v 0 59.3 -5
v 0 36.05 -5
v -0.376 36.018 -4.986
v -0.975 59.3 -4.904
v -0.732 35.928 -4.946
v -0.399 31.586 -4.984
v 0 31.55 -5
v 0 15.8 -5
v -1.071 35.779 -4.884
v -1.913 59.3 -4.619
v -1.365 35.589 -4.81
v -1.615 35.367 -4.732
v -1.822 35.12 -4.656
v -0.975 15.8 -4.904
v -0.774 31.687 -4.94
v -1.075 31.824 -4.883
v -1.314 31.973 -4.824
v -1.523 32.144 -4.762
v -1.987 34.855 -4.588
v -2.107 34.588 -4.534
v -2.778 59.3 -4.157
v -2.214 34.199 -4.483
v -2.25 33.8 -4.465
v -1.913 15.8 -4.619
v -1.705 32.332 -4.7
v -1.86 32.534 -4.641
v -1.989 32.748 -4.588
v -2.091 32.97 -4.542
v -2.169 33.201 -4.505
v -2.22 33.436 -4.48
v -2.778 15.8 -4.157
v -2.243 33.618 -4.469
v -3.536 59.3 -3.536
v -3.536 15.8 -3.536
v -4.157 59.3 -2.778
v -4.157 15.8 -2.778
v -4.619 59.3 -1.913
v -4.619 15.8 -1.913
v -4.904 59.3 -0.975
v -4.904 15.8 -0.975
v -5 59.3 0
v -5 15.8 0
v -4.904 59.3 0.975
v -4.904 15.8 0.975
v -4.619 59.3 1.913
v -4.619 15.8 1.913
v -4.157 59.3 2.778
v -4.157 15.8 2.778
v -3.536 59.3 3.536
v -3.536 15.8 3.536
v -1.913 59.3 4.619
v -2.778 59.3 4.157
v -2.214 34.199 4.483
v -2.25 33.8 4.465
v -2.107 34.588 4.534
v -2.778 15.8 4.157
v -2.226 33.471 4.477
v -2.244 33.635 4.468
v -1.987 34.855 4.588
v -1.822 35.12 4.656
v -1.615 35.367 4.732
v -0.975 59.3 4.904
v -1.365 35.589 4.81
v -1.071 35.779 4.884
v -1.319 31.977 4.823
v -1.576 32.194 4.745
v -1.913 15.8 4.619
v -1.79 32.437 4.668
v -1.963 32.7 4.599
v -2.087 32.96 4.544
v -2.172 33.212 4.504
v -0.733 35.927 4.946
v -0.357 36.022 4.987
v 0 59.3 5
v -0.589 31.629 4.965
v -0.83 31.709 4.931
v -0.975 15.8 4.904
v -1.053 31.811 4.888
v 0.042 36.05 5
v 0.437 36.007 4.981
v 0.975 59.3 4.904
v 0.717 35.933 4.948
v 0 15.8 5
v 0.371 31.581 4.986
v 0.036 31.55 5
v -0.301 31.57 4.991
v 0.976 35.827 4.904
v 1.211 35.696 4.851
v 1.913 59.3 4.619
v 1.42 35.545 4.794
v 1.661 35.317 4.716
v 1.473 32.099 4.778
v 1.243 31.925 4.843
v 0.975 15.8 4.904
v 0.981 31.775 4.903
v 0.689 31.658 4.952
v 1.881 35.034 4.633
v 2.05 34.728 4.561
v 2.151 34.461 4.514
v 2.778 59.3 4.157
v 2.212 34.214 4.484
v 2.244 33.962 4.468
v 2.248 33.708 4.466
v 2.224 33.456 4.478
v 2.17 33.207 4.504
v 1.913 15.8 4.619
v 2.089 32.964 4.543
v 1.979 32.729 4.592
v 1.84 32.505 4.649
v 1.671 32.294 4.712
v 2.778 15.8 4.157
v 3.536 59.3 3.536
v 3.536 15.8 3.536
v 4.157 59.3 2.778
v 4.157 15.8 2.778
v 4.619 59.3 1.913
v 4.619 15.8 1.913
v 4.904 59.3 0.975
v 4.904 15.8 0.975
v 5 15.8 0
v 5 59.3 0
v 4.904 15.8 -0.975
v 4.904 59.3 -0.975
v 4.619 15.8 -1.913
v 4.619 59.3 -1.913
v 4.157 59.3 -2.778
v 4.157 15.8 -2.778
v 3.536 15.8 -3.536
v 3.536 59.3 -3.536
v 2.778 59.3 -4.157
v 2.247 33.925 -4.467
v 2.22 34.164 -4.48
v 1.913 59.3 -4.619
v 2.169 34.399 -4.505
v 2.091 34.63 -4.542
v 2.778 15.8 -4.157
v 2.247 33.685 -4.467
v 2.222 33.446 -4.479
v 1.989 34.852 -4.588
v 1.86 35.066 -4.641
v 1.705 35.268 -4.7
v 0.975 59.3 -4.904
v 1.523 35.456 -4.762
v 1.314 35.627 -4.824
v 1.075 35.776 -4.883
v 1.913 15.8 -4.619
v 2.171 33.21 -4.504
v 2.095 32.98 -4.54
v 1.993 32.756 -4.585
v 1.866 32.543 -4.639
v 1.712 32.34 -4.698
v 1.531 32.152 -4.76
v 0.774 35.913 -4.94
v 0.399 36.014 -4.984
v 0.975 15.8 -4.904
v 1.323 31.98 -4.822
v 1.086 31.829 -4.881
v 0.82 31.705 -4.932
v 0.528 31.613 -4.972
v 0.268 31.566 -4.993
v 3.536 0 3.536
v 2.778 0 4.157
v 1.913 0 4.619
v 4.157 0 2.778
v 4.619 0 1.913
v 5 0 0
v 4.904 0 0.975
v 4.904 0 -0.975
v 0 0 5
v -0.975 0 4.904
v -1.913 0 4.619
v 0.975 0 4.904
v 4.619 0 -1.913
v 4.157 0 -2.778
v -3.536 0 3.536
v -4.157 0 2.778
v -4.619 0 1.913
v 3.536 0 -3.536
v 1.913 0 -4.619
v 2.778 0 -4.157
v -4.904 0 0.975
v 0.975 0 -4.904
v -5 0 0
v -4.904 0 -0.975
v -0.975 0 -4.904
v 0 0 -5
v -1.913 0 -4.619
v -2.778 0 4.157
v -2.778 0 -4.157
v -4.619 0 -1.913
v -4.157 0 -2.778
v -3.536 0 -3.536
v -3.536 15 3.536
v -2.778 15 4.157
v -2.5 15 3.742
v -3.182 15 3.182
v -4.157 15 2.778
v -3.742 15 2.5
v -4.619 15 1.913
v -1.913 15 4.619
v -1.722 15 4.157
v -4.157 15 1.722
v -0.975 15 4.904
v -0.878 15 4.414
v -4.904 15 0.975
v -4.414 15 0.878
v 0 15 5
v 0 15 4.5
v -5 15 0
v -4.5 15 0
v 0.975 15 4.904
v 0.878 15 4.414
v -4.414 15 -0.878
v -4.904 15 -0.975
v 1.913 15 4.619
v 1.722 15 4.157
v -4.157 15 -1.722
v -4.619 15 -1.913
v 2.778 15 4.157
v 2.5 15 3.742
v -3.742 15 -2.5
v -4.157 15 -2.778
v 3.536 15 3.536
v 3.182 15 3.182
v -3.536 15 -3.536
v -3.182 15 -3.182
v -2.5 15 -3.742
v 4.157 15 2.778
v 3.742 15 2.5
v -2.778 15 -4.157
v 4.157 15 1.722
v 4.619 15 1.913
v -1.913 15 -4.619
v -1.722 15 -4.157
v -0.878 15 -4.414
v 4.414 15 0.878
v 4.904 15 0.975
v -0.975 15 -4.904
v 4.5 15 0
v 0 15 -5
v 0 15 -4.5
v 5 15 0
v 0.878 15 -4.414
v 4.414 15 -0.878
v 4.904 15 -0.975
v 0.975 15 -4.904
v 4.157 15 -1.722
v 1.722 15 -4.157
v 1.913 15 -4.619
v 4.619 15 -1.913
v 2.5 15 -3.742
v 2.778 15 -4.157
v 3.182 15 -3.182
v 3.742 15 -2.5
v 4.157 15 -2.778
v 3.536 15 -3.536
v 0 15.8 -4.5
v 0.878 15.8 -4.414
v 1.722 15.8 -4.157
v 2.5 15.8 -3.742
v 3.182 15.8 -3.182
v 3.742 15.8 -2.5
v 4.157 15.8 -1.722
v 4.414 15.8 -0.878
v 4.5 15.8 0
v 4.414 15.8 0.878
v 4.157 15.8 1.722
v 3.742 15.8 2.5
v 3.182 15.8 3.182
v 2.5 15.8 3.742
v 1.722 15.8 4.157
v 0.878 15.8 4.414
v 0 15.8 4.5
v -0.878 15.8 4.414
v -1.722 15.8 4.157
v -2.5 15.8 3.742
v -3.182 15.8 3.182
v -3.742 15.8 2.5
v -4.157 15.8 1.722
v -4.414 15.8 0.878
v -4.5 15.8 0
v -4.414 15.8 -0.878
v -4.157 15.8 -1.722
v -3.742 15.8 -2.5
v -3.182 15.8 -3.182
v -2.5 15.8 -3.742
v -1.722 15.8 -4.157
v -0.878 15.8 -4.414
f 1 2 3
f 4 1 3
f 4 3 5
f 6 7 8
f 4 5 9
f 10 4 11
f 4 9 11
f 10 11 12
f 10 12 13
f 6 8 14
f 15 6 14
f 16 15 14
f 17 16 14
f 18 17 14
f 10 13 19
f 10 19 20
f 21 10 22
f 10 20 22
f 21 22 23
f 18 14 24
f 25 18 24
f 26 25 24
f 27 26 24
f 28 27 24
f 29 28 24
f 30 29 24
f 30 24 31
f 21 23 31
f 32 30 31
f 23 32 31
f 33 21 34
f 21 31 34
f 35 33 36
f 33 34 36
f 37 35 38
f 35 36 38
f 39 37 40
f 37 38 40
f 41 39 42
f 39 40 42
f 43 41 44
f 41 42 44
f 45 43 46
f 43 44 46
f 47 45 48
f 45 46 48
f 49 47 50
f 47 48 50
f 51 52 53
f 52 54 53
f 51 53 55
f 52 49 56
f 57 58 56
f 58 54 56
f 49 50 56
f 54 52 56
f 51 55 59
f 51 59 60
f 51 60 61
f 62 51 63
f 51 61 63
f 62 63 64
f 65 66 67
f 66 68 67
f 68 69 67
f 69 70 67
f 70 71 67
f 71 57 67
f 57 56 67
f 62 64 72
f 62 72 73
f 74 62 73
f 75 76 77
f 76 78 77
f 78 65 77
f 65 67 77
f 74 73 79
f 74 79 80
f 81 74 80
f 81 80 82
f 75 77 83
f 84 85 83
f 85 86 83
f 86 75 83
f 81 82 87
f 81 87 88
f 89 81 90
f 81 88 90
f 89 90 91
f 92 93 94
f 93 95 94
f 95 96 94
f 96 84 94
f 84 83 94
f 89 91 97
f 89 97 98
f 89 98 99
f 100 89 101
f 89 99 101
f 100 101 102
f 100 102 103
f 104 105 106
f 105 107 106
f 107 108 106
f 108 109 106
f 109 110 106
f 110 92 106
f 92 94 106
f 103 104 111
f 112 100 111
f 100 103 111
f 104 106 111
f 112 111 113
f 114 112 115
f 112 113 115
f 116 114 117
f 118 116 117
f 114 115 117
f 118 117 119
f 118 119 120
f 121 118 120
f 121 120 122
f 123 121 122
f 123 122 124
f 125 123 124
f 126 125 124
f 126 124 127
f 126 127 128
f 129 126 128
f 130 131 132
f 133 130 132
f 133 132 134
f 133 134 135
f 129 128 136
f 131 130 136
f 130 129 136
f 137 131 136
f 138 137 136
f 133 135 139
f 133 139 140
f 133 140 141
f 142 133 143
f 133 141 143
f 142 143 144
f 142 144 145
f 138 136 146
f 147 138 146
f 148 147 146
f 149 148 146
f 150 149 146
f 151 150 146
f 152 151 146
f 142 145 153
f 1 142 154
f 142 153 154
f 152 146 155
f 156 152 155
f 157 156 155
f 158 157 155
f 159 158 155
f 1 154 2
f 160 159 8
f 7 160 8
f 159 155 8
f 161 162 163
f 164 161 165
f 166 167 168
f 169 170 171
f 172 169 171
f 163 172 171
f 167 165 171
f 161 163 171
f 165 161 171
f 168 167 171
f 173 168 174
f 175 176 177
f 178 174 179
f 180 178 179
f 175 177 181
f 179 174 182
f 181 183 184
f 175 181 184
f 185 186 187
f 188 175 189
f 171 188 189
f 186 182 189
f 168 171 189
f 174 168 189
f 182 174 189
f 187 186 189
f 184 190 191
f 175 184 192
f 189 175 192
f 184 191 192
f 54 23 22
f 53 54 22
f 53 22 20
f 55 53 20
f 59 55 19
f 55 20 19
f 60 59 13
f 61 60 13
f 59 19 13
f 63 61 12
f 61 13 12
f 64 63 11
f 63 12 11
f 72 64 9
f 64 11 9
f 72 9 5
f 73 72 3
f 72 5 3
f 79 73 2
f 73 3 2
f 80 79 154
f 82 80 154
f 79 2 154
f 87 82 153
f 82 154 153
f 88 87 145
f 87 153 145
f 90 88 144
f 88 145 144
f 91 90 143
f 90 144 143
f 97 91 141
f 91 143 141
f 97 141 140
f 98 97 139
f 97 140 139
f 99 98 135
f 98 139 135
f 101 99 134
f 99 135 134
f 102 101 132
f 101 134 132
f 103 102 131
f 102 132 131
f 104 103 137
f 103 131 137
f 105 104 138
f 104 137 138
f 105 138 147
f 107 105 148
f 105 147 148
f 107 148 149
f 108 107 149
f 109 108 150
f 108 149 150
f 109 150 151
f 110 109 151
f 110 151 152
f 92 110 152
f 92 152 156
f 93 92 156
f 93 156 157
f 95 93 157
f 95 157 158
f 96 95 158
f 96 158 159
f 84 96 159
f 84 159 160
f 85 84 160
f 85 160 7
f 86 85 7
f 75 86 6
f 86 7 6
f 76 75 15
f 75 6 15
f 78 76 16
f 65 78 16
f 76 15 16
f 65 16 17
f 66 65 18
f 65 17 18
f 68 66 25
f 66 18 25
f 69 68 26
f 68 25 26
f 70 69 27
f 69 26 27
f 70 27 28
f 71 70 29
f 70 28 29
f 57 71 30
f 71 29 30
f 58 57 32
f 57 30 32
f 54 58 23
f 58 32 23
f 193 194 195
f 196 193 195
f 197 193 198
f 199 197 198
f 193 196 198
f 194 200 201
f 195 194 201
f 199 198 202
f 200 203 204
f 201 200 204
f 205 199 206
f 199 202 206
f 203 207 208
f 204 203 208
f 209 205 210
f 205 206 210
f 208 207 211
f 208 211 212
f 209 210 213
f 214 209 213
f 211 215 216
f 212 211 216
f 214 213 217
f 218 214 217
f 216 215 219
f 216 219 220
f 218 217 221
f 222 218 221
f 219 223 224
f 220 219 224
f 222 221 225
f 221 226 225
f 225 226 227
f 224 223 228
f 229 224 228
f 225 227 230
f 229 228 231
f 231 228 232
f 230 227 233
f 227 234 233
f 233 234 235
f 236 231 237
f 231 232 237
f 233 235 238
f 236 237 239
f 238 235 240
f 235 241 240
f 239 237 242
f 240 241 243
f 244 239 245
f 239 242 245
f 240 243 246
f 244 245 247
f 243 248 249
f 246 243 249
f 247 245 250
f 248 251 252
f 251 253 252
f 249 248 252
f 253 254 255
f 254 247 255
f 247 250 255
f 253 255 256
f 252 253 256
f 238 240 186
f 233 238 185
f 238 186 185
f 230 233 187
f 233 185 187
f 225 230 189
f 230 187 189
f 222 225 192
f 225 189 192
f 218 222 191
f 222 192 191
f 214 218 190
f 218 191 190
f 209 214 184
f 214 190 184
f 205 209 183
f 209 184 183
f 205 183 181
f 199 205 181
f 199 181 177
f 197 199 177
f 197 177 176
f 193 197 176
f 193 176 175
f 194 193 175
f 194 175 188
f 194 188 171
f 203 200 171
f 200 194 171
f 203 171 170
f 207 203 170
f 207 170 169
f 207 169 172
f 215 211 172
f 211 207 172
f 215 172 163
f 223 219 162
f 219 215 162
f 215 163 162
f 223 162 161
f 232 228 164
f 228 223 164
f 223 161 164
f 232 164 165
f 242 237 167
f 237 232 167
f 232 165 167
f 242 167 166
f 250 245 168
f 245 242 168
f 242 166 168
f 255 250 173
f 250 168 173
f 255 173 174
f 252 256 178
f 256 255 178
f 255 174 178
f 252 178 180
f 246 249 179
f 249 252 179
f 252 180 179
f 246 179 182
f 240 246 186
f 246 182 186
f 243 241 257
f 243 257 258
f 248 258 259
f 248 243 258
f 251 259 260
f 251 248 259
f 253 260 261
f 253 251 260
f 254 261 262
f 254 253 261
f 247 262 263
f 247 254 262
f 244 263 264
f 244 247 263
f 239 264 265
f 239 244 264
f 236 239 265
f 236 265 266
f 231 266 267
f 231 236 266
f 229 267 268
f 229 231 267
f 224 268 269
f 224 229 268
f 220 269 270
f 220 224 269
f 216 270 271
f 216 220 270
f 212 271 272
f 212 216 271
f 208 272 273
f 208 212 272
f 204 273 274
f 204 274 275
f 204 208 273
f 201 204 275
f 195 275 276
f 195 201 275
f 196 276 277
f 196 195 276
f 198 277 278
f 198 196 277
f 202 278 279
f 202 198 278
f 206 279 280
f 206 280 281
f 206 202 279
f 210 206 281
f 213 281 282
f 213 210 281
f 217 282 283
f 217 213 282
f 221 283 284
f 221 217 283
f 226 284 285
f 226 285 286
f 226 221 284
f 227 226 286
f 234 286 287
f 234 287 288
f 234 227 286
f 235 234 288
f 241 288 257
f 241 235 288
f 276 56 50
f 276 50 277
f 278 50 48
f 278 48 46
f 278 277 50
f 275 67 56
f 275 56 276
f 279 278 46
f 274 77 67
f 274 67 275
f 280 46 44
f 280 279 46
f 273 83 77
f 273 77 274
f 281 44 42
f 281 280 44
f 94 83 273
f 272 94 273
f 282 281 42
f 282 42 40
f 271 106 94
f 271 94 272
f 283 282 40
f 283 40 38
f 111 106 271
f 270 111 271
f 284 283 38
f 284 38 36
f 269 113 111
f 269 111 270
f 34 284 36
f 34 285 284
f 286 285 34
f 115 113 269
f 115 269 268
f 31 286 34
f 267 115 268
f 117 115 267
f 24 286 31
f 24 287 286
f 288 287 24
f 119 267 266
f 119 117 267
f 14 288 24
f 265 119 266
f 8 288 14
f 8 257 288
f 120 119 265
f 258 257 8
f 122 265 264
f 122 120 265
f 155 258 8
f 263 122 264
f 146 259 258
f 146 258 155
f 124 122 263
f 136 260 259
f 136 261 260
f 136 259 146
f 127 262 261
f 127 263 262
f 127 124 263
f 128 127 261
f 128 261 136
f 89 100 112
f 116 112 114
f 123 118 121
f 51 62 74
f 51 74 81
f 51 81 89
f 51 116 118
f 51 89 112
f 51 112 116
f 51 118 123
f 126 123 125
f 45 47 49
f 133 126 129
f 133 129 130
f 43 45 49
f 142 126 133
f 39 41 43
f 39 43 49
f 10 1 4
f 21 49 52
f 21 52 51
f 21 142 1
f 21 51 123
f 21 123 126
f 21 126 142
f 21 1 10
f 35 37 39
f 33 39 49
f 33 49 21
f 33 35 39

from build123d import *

# Parameters (mm, degrees)
SKETCH1_R            = 5
BOSS_EXTRUDE1_DEPTH  = 59.3
CUT_EXTRUDE1_START   = -15
SKETCH2_R            = 5
SKETCH2_R_2          = 4.5
CUT_EXTRUDE1_DEPTH   = 0.8
M4_CLEARANCE_HOLE1_D = 4.5


with BuildPart() as part:
    # Sketch1 → Boss-Extrude1 (new body)
    with BuildSketch(Plane(origin=(0, 0, 0), x_dir=(1, 0, 0), z_dir=(0, 1, 0))):
        with Locations(Location((0, 0, 0), (0, 0, 90))):
            Circle(SKETCH1_R)
    extrude(amount=BOSS_EXTRUDE1_DEPTH)

    # Sketch2 → Cut-Extrude1 (cut)
    with BuildSketch(Plane.XZ.offset(CUT_EXTRUDE1_START)):
        with Locations(Location((0, 0, 0), (0, 0, 270))):
            Circle(SKETCH2_R)
        with Locations(Location((0, 0, 0), (0, 0, 270))):
            Circle(SKETCH2_R_2, mode=Mode.SUBTRACT)
    extrude(amount=-CUT_EXTRUDE1_DEPTH, mode=Mode.SUBTRACT)

    # M4 Clearance Hole1 (through all)
    with Locations(Plane.XY.offset(5)):
        with Locations((0, 33.8)):
            Hole(M4_CLEARANCE_HOLE1_D / 2)


solid = part.part
